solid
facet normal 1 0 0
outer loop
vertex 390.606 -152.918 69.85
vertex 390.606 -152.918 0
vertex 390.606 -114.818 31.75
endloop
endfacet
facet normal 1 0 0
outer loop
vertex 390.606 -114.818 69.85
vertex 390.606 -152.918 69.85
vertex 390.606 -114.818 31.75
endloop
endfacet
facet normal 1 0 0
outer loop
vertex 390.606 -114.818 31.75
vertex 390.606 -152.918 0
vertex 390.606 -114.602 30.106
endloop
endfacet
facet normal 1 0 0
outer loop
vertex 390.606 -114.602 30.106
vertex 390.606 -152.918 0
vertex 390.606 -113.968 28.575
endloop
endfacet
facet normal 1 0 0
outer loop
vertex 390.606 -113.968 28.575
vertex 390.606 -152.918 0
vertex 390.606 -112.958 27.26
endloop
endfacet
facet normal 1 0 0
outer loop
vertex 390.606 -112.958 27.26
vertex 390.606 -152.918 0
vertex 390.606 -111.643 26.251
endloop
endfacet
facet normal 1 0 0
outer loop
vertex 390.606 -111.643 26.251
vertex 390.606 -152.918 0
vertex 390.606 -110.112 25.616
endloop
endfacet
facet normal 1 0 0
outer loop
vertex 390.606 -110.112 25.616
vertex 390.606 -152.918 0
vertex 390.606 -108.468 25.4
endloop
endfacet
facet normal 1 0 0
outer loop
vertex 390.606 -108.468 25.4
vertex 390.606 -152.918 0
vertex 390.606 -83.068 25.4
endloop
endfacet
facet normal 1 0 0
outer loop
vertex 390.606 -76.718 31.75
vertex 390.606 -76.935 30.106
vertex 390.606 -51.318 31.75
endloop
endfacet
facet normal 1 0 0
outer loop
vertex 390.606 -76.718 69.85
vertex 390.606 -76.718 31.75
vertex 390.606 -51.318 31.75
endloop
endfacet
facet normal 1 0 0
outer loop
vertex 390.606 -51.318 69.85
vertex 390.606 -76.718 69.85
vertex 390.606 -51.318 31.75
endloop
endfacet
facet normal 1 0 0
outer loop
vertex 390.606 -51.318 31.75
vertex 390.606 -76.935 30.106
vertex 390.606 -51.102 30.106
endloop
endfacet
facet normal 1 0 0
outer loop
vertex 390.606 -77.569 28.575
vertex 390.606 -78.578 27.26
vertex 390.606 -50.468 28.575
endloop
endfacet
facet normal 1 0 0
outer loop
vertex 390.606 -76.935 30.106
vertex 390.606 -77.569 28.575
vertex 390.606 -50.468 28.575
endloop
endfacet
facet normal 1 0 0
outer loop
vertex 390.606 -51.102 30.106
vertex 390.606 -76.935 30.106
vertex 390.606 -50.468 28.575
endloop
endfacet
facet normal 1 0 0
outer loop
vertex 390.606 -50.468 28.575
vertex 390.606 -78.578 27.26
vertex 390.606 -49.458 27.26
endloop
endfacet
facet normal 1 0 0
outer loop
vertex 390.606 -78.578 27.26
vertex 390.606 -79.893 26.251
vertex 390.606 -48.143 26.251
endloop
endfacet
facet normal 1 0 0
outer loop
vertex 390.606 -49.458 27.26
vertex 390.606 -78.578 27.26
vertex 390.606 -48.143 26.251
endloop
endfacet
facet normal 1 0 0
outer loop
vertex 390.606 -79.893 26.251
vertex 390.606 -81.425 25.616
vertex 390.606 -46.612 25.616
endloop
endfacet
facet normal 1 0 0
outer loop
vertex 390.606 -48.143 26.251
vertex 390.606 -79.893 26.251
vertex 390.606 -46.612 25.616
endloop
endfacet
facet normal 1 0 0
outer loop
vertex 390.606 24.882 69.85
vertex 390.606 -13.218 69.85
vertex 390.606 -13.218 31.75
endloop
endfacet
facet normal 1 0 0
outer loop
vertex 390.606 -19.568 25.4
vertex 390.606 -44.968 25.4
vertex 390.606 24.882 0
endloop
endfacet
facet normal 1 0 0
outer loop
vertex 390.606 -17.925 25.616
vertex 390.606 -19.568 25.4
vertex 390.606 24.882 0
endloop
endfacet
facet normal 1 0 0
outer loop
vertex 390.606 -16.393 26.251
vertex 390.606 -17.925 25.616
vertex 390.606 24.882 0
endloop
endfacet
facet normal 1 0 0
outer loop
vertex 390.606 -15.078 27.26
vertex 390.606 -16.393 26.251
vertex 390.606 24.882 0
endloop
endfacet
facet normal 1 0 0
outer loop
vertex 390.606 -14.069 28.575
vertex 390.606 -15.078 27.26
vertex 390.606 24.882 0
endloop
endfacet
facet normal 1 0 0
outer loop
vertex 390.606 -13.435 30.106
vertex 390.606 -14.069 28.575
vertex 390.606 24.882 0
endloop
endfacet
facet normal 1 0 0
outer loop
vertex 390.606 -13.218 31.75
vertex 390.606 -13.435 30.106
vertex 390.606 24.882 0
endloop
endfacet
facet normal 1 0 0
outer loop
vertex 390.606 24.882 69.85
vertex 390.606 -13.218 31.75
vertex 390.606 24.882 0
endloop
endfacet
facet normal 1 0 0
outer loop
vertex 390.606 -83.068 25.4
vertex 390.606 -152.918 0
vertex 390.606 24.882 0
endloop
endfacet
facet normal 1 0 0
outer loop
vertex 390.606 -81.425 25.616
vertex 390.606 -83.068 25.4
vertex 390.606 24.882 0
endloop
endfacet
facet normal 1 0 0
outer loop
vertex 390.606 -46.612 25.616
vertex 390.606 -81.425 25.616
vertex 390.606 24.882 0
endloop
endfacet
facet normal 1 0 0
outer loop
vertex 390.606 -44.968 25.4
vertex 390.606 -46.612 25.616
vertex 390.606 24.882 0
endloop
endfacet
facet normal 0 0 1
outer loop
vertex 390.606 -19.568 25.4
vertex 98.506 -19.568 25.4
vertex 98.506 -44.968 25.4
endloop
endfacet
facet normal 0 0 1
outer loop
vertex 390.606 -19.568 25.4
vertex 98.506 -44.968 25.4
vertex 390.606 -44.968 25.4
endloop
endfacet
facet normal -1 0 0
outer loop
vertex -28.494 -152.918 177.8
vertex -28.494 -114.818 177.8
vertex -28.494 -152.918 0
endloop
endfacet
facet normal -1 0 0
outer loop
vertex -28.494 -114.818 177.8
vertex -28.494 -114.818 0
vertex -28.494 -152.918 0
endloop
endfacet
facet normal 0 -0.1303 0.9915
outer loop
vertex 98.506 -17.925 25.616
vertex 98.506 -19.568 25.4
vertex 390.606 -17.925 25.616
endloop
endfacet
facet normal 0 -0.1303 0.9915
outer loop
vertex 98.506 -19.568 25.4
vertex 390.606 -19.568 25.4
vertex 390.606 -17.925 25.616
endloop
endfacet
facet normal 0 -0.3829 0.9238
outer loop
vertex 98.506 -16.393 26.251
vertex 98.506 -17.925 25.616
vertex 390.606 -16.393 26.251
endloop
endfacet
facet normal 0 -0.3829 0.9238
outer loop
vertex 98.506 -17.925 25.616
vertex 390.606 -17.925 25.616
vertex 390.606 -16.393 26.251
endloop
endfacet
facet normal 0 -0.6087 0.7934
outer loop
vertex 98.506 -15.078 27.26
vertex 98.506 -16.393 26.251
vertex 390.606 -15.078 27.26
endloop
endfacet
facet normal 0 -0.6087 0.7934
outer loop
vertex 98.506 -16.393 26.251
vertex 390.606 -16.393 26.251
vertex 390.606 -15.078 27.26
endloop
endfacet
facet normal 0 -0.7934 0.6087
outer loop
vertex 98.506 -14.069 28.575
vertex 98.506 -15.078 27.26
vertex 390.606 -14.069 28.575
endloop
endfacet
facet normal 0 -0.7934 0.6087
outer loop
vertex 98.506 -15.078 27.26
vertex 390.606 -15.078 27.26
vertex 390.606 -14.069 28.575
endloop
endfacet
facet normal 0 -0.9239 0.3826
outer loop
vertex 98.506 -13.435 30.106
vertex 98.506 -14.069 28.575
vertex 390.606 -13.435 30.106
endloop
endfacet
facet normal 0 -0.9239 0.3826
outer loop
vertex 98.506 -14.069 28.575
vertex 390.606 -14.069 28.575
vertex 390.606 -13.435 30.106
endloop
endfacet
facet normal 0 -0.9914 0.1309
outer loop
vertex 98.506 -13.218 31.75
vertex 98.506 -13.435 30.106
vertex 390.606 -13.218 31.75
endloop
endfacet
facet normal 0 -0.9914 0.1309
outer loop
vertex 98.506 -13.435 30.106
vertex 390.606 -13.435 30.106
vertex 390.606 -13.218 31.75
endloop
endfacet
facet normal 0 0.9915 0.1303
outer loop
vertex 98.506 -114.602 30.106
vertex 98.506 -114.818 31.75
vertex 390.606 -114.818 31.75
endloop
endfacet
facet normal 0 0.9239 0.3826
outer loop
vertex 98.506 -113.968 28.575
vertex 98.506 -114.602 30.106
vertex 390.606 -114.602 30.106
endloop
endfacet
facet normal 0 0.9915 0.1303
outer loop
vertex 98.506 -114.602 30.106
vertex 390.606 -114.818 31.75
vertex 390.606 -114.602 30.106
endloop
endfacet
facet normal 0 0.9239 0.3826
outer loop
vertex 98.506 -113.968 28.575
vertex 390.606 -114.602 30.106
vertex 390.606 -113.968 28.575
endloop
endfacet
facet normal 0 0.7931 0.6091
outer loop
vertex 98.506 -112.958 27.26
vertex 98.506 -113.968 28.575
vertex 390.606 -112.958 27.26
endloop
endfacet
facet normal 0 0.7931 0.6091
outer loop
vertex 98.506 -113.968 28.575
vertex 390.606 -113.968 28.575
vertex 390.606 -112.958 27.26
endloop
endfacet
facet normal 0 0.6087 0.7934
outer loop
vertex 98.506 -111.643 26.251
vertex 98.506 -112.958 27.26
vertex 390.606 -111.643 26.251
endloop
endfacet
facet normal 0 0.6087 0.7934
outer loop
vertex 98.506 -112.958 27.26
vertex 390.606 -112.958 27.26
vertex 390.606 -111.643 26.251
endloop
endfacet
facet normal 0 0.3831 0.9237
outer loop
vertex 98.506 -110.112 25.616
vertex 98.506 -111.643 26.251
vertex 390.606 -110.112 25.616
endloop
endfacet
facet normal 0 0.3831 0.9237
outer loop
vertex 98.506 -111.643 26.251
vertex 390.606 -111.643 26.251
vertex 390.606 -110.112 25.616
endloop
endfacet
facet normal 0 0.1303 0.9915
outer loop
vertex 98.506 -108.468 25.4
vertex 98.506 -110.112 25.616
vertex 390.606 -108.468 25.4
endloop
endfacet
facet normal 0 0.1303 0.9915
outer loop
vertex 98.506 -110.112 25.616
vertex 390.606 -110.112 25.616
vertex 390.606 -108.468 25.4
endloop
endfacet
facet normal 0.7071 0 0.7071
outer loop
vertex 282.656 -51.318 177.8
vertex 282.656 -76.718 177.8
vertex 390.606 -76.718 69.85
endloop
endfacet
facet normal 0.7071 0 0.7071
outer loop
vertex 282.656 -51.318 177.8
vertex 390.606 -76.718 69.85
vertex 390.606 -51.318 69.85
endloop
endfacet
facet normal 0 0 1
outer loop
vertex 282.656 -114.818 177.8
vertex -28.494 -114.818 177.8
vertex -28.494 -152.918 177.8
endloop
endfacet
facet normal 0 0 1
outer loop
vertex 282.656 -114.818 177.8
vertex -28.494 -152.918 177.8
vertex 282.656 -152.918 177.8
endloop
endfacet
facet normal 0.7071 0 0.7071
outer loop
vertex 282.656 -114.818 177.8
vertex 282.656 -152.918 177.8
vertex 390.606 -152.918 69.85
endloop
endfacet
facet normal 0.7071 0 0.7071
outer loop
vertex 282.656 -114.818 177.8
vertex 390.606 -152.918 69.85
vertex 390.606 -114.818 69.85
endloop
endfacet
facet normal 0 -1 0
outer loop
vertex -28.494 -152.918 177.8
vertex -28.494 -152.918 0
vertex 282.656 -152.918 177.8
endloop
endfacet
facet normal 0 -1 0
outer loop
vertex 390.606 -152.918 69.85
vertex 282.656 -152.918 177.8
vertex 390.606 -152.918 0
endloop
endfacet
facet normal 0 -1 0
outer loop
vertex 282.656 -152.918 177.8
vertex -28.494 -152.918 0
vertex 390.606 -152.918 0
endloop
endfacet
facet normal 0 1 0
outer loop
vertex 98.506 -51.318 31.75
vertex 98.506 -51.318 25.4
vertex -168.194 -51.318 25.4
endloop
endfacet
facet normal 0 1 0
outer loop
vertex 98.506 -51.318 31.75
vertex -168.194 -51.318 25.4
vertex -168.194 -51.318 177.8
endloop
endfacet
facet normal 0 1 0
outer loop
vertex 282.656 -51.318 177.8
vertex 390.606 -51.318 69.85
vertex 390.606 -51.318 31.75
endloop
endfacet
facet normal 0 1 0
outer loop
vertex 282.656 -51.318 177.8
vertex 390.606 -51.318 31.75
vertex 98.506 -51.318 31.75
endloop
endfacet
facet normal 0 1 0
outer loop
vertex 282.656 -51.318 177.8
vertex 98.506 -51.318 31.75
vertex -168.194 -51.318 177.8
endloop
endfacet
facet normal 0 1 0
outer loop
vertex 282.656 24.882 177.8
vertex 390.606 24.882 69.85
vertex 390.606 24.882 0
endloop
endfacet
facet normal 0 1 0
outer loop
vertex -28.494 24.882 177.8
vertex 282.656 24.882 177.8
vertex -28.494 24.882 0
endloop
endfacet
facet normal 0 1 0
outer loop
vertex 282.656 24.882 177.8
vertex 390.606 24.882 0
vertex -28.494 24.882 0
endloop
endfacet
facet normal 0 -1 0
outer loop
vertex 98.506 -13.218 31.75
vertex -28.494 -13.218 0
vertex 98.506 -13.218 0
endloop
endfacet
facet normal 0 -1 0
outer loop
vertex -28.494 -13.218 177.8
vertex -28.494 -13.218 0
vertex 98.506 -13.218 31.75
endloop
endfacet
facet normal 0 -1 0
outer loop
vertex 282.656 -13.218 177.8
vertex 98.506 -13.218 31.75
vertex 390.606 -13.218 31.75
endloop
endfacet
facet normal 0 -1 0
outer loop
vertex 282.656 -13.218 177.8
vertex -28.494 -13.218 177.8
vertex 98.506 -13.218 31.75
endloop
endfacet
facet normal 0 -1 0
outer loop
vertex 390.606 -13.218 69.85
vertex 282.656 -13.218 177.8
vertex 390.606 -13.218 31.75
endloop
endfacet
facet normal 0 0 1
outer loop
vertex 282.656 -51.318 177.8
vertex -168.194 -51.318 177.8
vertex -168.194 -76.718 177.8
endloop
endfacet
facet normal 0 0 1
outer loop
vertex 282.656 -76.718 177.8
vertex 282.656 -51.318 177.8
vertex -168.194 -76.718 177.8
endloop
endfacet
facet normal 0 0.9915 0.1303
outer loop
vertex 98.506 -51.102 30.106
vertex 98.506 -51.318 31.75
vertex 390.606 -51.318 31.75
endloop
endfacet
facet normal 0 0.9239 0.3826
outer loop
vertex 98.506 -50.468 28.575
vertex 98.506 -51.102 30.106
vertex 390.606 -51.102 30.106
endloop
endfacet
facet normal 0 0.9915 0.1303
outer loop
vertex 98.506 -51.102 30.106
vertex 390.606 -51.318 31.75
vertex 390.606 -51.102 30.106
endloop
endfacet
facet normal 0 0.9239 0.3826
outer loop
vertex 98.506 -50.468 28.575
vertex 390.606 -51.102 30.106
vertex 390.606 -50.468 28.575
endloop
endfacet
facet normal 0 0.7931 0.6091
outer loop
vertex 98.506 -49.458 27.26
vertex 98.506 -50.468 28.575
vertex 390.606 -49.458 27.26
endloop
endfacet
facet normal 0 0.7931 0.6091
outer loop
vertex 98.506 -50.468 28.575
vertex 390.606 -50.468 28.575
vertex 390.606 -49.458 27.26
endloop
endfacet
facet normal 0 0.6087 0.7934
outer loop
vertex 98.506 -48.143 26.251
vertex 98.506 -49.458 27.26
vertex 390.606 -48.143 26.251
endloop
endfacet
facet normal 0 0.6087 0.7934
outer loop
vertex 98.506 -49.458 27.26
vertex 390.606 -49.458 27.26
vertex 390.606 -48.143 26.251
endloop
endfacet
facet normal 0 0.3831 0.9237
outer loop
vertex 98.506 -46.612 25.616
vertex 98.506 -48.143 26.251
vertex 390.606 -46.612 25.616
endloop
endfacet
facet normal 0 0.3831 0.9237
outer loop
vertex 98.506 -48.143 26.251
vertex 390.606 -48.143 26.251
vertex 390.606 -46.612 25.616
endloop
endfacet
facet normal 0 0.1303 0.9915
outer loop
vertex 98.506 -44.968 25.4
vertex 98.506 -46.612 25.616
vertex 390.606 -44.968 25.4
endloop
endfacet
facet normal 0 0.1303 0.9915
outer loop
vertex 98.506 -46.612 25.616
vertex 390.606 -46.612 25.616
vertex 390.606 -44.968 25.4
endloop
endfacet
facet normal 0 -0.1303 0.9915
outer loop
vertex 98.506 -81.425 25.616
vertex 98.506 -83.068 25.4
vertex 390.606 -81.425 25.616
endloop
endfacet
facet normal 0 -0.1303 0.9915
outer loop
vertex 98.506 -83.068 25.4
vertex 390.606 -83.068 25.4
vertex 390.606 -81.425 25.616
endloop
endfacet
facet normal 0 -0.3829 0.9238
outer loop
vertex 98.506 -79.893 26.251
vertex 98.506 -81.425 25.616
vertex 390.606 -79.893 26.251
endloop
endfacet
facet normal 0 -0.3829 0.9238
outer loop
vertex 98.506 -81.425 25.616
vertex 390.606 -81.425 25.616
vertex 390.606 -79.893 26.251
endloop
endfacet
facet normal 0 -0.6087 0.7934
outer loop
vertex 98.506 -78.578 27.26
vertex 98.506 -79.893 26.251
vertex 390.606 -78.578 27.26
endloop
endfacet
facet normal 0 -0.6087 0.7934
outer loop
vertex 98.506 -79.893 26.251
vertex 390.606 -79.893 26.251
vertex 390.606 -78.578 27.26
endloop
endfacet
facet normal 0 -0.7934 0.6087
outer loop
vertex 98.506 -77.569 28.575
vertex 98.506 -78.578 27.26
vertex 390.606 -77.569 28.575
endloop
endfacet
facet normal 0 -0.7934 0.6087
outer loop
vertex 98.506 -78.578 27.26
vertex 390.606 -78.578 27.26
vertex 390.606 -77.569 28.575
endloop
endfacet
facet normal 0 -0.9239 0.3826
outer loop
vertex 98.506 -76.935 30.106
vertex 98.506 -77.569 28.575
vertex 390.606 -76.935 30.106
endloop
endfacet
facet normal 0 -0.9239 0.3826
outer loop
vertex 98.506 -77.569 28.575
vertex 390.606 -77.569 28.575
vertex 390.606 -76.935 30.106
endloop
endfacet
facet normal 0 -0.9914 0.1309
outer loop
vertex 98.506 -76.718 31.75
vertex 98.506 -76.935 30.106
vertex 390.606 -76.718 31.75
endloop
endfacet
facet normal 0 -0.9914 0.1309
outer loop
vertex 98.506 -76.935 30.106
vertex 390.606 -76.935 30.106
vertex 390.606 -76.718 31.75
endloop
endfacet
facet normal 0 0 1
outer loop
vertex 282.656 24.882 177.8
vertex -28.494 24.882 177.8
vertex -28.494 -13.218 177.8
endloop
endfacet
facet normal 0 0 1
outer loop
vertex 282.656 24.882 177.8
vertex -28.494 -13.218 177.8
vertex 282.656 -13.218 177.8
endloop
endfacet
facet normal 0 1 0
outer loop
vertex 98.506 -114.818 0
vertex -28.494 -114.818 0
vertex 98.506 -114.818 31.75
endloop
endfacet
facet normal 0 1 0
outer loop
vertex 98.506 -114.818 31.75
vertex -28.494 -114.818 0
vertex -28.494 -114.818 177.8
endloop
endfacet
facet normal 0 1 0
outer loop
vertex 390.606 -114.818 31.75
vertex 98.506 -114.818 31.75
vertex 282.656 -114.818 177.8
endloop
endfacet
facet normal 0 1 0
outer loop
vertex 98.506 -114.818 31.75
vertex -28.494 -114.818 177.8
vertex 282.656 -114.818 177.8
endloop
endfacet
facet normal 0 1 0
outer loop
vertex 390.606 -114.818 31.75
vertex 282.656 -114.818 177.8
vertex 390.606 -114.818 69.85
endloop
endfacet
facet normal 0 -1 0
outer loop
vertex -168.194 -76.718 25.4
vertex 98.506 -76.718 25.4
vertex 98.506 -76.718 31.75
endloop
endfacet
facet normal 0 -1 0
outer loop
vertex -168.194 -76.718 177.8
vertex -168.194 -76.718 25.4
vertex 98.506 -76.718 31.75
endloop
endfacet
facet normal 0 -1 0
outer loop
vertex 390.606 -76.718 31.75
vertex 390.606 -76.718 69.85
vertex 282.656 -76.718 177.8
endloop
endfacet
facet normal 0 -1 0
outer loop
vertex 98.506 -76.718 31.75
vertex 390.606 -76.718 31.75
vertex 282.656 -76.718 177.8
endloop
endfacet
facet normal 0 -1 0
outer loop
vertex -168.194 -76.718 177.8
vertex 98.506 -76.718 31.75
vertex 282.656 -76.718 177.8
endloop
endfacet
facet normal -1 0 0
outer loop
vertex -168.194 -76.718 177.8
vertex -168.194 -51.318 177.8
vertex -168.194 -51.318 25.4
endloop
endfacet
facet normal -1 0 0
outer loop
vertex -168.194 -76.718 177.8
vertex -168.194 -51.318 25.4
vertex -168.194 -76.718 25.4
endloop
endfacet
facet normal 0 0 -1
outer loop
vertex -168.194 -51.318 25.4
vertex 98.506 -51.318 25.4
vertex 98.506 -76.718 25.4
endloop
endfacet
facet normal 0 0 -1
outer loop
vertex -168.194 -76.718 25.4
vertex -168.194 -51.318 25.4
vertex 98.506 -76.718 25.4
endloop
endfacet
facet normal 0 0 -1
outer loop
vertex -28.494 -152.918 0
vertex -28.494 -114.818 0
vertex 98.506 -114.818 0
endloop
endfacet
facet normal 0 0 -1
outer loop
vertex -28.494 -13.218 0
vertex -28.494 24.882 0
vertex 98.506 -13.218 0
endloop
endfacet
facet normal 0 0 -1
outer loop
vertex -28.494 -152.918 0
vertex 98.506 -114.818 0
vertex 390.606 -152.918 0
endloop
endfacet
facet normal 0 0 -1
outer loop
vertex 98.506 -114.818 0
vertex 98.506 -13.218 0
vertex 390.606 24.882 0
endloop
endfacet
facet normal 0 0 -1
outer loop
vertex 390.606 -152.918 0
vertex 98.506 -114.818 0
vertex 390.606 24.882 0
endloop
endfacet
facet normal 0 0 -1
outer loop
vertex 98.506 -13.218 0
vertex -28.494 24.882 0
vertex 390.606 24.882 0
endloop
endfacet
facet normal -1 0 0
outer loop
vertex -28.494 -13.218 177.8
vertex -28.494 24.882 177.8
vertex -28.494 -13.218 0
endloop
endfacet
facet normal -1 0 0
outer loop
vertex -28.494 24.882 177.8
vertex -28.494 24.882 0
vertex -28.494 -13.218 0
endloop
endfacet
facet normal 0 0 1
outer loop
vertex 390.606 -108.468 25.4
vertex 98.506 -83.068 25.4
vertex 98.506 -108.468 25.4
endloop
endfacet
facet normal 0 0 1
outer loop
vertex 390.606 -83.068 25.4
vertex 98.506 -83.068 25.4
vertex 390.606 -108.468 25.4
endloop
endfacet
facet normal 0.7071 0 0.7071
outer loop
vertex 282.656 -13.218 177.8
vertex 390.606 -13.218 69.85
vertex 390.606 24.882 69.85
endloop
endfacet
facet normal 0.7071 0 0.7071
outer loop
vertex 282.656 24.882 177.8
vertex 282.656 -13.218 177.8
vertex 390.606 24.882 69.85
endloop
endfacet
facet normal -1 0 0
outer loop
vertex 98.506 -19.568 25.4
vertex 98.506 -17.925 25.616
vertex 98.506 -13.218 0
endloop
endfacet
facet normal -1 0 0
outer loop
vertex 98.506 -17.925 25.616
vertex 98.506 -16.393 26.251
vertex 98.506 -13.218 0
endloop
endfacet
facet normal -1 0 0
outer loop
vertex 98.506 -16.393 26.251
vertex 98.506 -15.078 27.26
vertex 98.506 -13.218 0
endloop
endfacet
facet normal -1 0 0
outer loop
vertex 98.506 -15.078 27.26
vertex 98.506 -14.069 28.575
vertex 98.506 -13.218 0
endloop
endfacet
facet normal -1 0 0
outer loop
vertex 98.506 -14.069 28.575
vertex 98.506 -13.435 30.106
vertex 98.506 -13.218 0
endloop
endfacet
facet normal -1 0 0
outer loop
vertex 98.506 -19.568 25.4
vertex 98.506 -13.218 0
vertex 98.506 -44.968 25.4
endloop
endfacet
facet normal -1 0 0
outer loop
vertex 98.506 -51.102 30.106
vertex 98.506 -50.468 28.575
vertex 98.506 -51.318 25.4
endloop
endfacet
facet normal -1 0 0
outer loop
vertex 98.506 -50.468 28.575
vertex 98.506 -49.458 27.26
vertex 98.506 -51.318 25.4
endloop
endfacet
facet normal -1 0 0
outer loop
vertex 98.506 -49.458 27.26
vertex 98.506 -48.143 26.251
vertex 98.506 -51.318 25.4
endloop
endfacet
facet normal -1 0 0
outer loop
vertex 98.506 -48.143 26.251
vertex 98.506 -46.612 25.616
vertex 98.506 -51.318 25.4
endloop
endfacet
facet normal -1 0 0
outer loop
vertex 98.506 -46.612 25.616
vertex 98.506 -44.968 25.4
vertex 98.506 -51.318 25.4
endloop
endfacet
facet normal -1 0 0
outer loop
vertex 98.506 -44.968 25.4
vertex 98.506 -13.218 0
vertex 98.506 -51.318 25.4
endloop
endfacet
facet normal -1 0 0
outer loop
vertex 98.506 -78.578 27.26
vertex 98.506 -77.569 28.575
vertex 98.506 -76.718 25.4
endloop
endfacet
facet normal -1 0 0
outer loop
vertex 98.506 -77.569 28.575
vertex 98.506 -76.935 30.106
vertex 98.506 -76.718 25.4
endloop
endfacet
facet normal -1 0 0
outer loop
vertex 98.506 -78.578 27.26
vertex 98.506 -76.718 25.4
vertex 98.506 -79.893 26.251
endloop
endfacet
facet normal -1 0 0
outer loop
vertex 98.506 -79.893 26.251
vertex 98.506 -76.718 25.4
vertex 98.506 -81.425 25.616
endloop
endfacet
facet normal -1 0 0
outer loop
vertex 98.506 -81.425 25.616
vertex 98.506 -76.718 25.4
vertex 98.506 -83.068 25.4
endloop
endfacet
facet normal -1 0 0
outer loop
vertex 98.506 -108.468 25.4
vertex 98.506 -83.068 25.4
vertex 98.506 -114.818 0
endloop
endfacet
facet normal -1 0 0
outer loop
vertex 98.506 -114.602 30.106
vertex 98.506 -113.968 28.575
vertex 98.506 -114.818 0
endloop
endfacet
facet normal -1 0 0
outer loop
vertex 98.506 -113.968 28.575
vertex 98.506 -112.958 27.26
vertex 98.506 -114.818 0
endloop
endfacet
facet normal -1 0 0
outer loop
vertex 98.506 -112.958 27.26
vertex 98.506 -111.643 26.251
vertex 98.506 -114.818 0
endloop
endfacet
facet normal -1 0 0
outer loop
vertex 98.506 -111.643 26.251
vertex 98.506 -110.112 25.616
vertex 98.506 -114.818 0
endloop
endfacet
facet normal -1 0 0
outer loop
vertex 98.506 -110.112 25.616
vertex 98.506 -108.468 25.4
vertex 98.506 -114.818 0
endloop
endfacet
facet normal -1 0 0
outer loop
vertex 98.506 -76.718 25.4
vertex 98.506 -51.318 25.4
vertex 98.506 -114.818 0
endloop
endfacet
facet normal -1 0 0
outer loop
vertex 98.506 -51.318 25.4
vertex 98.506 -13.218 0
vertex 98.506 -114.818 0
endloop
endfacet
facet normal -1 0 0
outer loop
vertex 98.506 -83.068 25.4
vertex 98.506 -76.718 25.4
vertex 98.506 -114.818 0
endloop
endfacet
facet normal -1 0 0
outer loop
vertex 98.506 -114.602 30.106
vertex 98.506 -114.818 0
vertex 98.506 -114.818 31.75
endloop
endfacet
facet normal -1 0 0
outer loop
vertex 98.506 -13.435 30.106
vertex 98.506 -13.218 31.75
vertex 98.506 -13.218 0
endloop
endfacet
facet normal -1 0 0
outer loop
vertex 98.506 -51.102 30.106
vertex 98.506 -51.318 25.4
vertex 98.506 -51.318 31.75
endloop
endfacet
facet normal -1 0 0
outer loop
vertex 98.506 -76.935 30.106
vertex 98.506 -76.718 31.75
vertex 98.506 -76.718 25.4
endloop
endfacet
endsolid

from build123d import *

# Parameters (mm, degrees)
F0_W     = 292.1
F0_H     = 44.45
F1_DEPTH = 25.4
F3_DEPTH = 152.4
F4_W     = 292.1
F4_H     = 38.1
F5_DEPTH = 152.4
F6_SIZE  = 107.95
F7_W     = 25.4
F7_H     = 152.4
F8_DEPTH = 266.7
F9_R     = 6.35
F10_R    = 6.35


with BuildPart() as f1:
    # F0 (on Top) → F1 (new body)
    with BuildSketch(Plane.XY):
        Polygon((390.6061206371, 24.8817224056), (-28.4938793629, 24.8817224056), (-28.4938793629, -13.2182775944), (98.5061206371, -13.2182775944), (390.6061206371, -13.2182775944), align=None)
        with Locations((244.5561206371, -35.4432775944)):
            Rectangle(F0_W, F0_H)
        Polygon((390.6061206371, -70.3682775944), (390.6061206371, -57.6682775944), (98.5061206371, -57.6682775944), (98.5061206371, -64.0182775944), (98.5061206371, -70.3682775944), align=None)
        with Locations((244.5561206371, -92.5932775944)):
            Rectangle(F0_W, F0_H)
        Polygon((390.6061206371, -152.9182775944), (390.6061206371, -114.8182775944), (98.5061206371, -114.8182775944), (-28.4938793629, -114.8182775944), (-28.4938793629, -152.9182775944), align=None)
    extrude(amount=F1_DEPTH)

    # F3 (add): a face of the model
    f3_faces = [f1.faces().sort_by_distance(p)[0] for p in [
        (211.6425080716, -64.0182775944, 25.4),
    ]]
    extrude(f3_faces, amount=F3_DEPTH)

    # F4 (on face) → F5 (cut)
    with BuildSketch(Plane.XY.offset(177.8)):
        with Locations((244.5561206371, -32.2682775944)):
            Rectangle(F4_W, F4_H)
        with Locations((244.5561206371, -95.7682775944)):
            Rectangle(F4_W, F4_H)
    extrude(amount=-F5_DEPTH, mode=Mode.SUBTRACT)

    # F6
    f6_edges = [f1.edges().sort_by_distance(p)[0] for p in [
        (390.606121, -133.868278, 177.8),
        (390.606121, -64.018278, 177.8),
        (390.606121, 5.831722, 177.8),
    ]]
    chamfer(f6_edges, length=F6_SIZE)

    # F7 (on face) → F8 (join)
    with BuildSketch(Plane(origin=(98.5061206371, 0, 0), x_dir=(0, -1, 0), z_dir=(-1, 0, 0))):
        with Locations((64.0182775944, 101.6)):
            Rectangle(F7_W, F7_H)
    extrude(amount=F8_DEPTH)

    # F9
    f9_edges = [f1.edges().sort_by_distance(p)[0] for p in [
        (244.556121, -114.818278, 25.4),
    ]]
    fillet(f9_edges, radius=F9_R)

    # F10
    f10_edges = [f1.edges().sort_by_distance(p)[0] for p in [
        (244.556121, -51.318278, 25.4),
        (244.556121, -76.718278, 25.4),
        (244.556121, -13.218278, 25.4),
    ]]
    fillet(f10_edges, radius=F10_R)


solid = f1.part
